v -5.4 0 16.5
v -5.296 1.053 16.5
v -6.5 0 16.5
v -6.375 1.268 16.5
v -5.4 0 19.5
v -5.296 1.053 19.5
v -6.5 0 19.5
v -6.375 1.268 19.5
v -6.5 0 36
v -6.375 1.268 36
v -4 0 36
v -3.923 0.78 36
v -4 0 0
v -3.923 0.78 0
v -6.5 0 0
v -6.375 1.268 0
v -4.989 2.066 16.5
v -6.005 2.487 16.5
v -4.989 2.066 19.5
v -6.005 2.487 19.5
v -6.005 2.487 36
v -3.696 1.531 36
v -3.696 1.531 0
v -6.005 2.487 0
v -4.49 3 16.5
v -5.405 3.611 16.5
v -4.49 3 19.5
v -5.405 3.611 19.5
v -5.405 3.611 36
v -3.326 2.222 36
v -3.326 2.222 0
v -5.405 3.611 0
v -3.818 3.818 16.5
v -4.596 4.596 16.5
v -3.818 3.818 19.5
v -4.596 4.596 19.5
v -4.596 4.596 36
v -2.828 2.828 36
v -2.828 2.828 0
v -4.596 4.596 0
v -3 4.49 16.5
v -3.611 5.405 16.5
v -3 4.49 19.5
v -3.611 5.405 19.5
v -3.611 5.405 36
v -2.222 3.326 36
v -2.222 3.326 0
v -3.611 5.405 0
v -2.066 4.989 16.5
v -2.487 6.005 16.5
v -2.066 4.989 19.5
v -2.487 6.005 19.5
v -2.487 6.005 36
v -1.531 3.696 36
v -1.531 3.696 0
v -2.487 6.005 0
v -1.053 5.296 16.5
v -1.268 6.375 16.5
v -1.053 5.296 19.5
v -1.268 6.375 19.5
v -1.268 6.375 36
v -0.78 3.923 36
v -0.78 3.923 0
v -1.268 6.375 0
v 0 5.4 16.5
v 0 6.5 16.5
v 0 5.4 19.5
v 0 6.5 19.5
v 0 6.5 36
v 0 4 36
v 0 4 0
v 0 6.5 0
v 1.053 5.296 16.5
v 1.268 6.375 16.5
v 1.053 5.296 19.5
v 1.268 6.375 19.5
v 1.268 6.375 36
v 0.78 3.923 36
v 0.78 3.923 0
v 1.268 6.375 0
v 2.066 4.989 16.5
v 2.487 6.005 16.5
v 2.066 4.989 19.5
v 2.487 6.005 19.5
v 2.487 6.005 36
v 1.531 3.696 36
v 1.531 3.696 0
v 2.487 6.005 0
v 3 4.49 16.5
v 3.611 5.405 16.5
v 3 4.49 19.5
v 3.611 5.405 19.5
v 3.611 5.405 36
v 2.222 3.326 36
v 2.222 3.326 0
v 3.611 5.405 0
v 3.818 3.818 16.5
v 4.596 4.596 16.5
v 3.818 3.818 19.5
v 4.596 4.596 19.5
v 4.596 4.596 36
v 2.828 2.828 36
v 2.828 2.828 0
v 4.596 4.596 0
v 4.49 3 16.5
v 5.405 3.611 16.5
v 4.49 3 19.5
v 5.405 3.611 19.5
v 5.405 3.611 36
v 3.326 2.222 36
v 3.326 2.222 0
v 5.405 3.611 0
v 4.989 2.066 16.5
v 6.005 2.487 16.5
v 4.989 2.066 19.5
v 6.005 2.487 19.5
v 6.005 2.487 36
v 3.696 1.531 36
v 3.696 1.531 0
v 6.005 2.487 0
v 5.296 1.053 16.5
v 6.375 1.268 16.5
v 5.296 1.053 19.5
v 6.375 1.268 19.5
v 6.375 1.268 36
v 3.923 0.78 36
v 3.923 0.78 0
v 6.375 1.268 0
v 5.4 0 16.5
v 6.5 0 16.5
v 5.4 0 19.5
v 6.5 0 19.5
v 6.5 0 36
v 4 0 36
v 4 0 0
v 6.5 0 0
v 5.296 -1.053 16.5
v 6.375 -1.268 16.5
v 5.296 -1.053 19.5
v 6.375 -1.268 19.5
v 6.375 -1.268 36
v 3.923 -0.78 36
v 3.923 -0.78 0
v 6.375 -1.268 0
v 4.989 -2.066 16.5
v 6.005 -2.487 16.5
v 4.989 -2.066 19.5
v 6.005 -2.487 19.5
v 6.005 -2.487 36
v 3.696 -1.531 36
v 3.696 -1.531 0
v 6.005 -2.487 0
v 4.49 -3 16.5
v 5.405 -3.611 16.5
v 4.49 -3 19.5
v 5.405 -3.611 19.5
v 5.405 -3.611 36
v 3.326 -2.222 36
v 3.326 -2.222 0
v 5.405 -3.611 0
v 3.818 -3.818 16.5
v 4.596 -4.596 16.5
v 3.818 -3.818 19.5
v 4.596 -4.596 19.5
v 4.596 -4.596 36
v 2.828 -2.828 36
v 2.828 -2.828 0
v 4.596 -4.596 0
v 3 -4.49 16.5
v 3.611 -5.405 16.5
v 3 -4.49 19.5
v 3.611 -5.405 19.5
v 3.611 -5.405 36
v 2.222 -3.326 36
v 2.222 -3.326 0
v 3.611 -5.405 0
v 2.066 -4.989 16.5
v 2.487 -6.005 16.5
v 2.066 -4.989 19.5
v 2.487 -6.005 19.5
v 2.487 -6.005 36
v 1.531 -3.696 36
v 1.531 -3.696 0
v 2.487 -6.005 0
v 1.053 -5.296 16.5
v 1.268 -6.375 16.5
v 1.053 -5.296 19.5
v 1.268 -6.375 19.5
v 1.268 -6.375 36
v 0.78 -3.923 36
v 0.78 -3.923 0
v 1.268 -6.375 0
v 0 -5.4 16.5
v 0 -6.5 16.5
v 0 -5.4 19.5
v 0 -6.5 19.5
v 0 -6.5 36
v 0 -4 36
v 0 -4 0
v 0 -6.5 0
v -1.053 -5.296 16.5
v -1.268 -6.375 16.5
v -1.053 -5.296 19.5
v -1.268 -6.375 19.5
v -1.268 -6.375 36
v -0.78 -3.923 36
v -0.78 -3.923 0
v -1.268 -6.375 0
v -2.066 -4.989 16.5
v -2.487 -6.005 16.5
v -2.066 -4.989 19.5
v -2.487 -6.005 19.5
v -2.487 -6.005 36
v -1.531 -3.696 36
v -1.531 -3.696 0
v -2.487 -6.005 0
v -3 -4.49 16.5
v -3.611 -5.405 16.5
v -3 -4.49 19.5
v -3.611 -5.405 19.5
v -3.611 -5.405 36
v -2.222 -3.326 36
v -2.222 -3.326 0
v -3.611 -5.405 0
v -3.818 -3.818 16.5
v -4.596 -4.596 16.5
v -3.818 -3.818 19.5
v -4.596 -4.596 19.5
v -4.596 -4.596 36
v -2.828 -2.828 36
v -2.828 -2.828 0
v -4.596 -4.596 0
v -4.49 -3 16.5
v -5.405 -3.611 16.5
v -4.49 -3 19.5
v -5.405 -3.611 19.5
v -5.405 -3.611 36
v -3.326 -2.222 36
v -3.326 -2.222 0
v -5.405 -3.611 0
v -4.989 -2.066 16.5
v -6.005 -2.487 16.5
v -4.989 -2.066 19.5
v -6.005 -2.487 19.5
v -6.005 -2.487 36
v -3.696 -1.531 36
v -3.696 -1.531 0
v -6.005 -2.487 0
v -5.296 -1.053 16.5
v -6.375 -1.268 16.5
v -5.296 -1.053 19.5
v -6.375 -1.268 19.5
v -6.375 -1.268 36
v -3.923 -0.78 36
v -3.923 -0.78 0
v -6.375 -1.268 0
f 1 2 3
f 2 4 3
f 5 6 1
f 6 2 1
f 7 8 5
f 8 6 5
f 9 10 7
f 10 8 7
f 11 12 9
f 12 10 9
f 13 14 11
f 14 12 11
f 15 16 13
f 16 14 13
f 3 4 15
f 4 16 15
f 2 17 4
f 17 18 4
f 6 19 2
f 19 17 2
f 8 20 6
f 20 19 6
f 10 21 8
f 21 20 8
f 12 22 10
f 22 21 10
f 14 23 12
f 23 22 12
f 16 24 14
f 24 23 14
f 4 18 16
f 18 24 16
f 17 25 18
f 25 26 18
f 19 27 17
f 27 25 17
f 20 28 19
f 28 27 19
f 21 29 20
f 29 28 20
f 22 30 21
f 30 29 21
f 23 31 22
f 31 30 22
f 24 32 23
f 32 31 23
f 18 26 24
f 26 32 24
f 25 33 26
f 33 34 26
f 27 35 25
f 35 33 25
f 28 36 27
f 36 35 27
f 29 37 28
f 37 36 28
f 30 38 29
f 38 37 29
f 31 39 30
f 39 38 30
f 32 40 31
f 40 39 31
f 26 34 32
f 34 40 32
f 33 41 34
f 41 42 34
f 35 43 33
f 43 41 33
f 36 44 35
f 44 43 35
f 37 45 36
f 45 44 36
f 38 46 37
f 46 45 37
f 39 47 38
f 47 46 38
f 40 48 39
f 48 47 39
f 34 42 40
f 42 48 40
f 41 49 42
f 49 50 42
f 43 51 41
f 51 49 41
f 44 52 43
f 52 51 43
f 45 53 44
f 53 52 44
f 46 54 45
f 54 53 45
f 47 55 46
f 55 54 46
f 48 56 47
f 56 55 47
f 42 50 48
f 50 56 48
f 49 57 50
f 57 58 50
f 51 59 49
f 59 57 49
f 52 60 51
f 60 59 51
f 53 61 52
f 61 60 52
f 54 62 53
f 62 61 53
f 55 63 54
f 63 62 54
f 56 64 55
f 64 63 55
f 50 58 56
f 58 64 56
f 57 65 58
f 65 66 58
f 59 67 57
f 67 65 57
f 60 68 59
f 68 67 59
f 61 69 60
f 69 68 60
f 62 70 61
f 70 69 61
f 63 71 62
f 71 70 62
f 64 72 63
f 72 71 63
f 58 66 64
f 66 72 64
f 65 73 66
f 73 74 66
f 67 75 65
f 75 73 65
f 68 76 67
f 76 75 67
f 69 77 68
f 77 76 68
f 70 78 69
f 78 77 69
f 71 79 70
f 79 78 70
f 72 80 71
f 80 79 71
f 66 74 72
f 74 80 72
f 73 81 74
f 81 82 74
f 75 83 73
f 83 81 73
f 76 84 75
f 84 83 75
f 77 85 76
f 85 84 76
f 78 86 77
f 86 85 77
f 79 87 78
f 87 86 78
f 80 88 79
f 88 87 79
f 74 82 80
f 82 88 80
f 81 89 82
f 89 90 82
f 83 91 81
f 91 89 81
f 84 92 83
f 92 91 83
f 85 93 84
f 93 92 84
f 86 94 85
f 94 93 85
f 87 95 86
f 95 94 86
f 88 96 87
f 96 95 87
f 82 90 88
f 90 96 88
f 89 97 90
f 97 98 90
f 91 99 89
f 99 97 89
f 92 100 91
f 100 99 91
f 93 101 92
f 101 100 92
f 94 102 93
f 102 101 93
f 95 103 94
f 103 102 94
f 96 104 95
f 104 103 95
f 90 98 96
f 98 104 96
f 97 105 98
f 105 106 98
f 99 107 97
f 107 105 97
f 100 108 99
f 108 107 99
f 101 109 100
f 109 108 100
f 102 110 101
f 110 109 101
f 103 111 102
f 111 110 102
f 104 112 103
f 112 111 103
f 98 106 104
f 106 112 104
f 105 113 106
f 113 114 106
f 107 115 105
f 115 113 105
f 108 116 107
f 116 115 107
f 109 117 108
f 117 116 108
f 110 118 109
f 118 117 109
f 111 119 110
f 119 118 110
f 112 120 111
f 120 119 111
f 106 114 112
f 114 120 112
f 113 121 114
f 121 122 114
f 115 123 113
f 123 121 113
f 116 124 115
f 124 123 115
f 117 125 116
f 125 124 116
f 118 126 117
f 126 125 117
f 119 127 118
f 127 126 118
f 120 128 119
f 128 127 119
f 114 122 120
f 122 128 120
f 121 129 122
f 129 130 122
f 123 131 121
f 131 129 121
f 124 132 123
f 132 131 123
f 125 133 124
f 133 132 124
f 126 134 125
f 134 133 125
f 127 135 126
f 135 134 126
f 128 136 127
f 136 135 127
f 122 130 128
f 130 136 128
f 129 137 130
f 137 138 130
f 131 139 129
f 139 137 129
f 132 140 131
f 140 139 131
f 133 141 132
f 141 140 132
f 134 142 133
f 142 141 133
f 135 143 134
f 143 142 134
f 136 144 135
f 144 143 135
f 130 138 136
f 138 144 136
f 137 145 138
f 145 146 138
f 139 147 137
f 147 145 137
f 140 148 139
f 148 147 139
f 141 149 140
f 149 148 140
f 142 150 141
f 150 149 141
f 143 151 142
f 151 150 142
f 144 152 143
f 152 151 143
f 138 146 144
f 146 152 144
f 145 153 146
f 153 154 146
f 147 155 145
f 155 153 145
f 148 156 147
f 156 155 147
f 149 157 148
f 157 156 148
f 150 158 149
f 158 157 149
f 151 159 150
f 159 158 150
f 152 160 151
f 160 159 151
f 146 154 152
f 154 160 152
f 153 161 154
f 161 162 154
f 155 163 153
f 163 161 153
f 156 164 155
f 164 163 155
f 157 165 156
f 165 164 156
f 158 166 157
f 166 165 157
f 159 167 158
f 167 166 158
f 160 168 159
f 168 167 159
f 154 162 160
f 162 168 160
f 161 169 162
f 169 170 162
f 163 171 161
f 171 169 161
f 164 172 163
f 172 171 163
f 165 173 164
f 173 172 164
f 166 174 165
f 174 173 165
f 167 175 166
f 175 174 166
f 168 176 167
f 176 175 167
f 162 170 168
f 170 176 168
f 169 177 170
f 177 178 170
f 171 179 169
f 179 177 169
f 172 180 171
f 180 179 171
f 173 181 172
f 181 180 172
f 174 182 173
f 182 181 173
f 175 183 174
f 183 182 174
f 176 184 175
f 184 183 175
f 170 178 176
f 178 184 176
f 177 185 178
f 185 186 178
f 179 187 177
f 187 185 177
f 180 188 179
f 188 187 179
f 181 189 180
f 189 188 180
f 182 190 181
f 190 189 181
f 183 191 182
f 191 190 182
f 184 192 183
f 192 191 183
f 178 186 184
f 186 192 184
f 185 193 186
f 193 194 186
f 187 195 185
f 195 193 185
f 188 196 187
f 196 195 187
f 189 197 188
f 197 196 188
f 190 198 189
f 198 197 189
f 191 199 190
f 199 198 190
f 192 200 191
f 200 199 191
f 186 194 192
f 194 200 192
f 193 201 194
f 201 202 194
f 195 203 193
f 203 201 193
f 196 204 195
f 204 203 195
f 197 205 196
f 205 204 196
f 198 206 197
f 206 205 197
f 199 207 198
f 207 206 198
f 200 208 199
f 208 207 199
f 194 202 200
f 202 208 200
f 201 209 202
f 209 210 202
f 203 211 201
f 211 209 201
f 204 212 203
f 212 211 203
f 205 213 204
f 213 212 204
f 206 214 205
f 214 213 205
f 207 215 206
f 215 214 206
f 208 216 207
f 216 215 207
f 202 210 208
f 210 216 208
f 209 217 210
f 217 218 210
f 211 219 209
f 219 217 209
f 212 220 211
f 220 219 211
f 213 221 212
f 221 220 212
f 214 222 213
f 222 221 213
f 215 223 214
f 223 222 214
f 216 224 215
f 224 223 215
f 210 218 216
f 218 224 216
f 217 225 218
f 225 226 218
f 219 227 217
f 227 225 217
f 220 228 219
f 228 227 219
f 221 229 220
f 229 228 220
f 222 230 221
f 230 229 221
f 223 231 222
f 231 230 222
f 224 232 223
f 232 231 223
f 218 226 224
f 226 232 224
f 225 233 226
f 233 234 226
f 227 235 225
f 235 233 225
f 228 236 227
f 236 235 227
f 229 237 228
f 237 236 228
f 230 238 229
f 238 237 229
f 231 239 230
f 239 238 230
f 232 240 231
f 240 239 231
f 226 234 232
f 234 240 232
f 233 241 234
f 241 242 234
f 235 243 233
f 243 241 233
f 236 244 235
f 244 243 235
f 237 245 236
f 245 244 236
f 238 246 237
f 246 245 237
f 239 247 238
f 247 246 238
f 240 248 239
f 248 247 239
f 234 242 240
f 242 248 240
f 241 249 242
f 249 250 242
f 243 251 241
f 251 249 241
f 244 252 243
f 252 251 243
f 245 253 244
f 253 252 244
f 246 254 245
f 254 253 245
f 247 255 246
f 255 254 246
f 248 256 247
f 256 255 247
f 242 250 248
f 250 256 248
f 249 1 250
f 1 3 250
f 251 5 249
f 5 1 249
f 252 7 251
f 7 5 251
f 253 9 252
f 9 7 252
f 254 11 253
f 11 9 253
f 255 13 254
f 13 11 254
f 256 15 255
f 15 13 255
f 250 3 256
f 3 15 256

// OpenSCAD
$fn = 32;

// ----------------------------------------------------------------------
// Grooved revolve: stepped, bore R4
// ----------------------------------------------------------------------

// --- parameters (mm) ---
bore_r = 4;               // bore radius
outer_r = 6.5;            // outer radius of the body
total_h = 36;             // overall height, Z
wall = 2.5;               // radial wall thickness
groove_w = 3;             // groove width
groove_d = 1.1;           // groove depth
grooves = 1;              // number of outer grooves

bbox_x = 2 * outer_r;  // full diameter
bore_d = 2 * bore_r;  // bore diameter
body_d = 2 * outer_r;  // body diameter
revolve_angle = 360;  // full turn around the Z axis

profile = [[4, 0], [6.5, 0], [6.5, 16.5], [5.4, 16.5], [5.4, 19.5], [6.5, 19.5], [6.5, 36], [4, 36]];  // primary outline, 8 points, counter clockwise

// --- the one profile operation ---
rotate_extrude(angle = revolve_angle) polygon(points = profile);
